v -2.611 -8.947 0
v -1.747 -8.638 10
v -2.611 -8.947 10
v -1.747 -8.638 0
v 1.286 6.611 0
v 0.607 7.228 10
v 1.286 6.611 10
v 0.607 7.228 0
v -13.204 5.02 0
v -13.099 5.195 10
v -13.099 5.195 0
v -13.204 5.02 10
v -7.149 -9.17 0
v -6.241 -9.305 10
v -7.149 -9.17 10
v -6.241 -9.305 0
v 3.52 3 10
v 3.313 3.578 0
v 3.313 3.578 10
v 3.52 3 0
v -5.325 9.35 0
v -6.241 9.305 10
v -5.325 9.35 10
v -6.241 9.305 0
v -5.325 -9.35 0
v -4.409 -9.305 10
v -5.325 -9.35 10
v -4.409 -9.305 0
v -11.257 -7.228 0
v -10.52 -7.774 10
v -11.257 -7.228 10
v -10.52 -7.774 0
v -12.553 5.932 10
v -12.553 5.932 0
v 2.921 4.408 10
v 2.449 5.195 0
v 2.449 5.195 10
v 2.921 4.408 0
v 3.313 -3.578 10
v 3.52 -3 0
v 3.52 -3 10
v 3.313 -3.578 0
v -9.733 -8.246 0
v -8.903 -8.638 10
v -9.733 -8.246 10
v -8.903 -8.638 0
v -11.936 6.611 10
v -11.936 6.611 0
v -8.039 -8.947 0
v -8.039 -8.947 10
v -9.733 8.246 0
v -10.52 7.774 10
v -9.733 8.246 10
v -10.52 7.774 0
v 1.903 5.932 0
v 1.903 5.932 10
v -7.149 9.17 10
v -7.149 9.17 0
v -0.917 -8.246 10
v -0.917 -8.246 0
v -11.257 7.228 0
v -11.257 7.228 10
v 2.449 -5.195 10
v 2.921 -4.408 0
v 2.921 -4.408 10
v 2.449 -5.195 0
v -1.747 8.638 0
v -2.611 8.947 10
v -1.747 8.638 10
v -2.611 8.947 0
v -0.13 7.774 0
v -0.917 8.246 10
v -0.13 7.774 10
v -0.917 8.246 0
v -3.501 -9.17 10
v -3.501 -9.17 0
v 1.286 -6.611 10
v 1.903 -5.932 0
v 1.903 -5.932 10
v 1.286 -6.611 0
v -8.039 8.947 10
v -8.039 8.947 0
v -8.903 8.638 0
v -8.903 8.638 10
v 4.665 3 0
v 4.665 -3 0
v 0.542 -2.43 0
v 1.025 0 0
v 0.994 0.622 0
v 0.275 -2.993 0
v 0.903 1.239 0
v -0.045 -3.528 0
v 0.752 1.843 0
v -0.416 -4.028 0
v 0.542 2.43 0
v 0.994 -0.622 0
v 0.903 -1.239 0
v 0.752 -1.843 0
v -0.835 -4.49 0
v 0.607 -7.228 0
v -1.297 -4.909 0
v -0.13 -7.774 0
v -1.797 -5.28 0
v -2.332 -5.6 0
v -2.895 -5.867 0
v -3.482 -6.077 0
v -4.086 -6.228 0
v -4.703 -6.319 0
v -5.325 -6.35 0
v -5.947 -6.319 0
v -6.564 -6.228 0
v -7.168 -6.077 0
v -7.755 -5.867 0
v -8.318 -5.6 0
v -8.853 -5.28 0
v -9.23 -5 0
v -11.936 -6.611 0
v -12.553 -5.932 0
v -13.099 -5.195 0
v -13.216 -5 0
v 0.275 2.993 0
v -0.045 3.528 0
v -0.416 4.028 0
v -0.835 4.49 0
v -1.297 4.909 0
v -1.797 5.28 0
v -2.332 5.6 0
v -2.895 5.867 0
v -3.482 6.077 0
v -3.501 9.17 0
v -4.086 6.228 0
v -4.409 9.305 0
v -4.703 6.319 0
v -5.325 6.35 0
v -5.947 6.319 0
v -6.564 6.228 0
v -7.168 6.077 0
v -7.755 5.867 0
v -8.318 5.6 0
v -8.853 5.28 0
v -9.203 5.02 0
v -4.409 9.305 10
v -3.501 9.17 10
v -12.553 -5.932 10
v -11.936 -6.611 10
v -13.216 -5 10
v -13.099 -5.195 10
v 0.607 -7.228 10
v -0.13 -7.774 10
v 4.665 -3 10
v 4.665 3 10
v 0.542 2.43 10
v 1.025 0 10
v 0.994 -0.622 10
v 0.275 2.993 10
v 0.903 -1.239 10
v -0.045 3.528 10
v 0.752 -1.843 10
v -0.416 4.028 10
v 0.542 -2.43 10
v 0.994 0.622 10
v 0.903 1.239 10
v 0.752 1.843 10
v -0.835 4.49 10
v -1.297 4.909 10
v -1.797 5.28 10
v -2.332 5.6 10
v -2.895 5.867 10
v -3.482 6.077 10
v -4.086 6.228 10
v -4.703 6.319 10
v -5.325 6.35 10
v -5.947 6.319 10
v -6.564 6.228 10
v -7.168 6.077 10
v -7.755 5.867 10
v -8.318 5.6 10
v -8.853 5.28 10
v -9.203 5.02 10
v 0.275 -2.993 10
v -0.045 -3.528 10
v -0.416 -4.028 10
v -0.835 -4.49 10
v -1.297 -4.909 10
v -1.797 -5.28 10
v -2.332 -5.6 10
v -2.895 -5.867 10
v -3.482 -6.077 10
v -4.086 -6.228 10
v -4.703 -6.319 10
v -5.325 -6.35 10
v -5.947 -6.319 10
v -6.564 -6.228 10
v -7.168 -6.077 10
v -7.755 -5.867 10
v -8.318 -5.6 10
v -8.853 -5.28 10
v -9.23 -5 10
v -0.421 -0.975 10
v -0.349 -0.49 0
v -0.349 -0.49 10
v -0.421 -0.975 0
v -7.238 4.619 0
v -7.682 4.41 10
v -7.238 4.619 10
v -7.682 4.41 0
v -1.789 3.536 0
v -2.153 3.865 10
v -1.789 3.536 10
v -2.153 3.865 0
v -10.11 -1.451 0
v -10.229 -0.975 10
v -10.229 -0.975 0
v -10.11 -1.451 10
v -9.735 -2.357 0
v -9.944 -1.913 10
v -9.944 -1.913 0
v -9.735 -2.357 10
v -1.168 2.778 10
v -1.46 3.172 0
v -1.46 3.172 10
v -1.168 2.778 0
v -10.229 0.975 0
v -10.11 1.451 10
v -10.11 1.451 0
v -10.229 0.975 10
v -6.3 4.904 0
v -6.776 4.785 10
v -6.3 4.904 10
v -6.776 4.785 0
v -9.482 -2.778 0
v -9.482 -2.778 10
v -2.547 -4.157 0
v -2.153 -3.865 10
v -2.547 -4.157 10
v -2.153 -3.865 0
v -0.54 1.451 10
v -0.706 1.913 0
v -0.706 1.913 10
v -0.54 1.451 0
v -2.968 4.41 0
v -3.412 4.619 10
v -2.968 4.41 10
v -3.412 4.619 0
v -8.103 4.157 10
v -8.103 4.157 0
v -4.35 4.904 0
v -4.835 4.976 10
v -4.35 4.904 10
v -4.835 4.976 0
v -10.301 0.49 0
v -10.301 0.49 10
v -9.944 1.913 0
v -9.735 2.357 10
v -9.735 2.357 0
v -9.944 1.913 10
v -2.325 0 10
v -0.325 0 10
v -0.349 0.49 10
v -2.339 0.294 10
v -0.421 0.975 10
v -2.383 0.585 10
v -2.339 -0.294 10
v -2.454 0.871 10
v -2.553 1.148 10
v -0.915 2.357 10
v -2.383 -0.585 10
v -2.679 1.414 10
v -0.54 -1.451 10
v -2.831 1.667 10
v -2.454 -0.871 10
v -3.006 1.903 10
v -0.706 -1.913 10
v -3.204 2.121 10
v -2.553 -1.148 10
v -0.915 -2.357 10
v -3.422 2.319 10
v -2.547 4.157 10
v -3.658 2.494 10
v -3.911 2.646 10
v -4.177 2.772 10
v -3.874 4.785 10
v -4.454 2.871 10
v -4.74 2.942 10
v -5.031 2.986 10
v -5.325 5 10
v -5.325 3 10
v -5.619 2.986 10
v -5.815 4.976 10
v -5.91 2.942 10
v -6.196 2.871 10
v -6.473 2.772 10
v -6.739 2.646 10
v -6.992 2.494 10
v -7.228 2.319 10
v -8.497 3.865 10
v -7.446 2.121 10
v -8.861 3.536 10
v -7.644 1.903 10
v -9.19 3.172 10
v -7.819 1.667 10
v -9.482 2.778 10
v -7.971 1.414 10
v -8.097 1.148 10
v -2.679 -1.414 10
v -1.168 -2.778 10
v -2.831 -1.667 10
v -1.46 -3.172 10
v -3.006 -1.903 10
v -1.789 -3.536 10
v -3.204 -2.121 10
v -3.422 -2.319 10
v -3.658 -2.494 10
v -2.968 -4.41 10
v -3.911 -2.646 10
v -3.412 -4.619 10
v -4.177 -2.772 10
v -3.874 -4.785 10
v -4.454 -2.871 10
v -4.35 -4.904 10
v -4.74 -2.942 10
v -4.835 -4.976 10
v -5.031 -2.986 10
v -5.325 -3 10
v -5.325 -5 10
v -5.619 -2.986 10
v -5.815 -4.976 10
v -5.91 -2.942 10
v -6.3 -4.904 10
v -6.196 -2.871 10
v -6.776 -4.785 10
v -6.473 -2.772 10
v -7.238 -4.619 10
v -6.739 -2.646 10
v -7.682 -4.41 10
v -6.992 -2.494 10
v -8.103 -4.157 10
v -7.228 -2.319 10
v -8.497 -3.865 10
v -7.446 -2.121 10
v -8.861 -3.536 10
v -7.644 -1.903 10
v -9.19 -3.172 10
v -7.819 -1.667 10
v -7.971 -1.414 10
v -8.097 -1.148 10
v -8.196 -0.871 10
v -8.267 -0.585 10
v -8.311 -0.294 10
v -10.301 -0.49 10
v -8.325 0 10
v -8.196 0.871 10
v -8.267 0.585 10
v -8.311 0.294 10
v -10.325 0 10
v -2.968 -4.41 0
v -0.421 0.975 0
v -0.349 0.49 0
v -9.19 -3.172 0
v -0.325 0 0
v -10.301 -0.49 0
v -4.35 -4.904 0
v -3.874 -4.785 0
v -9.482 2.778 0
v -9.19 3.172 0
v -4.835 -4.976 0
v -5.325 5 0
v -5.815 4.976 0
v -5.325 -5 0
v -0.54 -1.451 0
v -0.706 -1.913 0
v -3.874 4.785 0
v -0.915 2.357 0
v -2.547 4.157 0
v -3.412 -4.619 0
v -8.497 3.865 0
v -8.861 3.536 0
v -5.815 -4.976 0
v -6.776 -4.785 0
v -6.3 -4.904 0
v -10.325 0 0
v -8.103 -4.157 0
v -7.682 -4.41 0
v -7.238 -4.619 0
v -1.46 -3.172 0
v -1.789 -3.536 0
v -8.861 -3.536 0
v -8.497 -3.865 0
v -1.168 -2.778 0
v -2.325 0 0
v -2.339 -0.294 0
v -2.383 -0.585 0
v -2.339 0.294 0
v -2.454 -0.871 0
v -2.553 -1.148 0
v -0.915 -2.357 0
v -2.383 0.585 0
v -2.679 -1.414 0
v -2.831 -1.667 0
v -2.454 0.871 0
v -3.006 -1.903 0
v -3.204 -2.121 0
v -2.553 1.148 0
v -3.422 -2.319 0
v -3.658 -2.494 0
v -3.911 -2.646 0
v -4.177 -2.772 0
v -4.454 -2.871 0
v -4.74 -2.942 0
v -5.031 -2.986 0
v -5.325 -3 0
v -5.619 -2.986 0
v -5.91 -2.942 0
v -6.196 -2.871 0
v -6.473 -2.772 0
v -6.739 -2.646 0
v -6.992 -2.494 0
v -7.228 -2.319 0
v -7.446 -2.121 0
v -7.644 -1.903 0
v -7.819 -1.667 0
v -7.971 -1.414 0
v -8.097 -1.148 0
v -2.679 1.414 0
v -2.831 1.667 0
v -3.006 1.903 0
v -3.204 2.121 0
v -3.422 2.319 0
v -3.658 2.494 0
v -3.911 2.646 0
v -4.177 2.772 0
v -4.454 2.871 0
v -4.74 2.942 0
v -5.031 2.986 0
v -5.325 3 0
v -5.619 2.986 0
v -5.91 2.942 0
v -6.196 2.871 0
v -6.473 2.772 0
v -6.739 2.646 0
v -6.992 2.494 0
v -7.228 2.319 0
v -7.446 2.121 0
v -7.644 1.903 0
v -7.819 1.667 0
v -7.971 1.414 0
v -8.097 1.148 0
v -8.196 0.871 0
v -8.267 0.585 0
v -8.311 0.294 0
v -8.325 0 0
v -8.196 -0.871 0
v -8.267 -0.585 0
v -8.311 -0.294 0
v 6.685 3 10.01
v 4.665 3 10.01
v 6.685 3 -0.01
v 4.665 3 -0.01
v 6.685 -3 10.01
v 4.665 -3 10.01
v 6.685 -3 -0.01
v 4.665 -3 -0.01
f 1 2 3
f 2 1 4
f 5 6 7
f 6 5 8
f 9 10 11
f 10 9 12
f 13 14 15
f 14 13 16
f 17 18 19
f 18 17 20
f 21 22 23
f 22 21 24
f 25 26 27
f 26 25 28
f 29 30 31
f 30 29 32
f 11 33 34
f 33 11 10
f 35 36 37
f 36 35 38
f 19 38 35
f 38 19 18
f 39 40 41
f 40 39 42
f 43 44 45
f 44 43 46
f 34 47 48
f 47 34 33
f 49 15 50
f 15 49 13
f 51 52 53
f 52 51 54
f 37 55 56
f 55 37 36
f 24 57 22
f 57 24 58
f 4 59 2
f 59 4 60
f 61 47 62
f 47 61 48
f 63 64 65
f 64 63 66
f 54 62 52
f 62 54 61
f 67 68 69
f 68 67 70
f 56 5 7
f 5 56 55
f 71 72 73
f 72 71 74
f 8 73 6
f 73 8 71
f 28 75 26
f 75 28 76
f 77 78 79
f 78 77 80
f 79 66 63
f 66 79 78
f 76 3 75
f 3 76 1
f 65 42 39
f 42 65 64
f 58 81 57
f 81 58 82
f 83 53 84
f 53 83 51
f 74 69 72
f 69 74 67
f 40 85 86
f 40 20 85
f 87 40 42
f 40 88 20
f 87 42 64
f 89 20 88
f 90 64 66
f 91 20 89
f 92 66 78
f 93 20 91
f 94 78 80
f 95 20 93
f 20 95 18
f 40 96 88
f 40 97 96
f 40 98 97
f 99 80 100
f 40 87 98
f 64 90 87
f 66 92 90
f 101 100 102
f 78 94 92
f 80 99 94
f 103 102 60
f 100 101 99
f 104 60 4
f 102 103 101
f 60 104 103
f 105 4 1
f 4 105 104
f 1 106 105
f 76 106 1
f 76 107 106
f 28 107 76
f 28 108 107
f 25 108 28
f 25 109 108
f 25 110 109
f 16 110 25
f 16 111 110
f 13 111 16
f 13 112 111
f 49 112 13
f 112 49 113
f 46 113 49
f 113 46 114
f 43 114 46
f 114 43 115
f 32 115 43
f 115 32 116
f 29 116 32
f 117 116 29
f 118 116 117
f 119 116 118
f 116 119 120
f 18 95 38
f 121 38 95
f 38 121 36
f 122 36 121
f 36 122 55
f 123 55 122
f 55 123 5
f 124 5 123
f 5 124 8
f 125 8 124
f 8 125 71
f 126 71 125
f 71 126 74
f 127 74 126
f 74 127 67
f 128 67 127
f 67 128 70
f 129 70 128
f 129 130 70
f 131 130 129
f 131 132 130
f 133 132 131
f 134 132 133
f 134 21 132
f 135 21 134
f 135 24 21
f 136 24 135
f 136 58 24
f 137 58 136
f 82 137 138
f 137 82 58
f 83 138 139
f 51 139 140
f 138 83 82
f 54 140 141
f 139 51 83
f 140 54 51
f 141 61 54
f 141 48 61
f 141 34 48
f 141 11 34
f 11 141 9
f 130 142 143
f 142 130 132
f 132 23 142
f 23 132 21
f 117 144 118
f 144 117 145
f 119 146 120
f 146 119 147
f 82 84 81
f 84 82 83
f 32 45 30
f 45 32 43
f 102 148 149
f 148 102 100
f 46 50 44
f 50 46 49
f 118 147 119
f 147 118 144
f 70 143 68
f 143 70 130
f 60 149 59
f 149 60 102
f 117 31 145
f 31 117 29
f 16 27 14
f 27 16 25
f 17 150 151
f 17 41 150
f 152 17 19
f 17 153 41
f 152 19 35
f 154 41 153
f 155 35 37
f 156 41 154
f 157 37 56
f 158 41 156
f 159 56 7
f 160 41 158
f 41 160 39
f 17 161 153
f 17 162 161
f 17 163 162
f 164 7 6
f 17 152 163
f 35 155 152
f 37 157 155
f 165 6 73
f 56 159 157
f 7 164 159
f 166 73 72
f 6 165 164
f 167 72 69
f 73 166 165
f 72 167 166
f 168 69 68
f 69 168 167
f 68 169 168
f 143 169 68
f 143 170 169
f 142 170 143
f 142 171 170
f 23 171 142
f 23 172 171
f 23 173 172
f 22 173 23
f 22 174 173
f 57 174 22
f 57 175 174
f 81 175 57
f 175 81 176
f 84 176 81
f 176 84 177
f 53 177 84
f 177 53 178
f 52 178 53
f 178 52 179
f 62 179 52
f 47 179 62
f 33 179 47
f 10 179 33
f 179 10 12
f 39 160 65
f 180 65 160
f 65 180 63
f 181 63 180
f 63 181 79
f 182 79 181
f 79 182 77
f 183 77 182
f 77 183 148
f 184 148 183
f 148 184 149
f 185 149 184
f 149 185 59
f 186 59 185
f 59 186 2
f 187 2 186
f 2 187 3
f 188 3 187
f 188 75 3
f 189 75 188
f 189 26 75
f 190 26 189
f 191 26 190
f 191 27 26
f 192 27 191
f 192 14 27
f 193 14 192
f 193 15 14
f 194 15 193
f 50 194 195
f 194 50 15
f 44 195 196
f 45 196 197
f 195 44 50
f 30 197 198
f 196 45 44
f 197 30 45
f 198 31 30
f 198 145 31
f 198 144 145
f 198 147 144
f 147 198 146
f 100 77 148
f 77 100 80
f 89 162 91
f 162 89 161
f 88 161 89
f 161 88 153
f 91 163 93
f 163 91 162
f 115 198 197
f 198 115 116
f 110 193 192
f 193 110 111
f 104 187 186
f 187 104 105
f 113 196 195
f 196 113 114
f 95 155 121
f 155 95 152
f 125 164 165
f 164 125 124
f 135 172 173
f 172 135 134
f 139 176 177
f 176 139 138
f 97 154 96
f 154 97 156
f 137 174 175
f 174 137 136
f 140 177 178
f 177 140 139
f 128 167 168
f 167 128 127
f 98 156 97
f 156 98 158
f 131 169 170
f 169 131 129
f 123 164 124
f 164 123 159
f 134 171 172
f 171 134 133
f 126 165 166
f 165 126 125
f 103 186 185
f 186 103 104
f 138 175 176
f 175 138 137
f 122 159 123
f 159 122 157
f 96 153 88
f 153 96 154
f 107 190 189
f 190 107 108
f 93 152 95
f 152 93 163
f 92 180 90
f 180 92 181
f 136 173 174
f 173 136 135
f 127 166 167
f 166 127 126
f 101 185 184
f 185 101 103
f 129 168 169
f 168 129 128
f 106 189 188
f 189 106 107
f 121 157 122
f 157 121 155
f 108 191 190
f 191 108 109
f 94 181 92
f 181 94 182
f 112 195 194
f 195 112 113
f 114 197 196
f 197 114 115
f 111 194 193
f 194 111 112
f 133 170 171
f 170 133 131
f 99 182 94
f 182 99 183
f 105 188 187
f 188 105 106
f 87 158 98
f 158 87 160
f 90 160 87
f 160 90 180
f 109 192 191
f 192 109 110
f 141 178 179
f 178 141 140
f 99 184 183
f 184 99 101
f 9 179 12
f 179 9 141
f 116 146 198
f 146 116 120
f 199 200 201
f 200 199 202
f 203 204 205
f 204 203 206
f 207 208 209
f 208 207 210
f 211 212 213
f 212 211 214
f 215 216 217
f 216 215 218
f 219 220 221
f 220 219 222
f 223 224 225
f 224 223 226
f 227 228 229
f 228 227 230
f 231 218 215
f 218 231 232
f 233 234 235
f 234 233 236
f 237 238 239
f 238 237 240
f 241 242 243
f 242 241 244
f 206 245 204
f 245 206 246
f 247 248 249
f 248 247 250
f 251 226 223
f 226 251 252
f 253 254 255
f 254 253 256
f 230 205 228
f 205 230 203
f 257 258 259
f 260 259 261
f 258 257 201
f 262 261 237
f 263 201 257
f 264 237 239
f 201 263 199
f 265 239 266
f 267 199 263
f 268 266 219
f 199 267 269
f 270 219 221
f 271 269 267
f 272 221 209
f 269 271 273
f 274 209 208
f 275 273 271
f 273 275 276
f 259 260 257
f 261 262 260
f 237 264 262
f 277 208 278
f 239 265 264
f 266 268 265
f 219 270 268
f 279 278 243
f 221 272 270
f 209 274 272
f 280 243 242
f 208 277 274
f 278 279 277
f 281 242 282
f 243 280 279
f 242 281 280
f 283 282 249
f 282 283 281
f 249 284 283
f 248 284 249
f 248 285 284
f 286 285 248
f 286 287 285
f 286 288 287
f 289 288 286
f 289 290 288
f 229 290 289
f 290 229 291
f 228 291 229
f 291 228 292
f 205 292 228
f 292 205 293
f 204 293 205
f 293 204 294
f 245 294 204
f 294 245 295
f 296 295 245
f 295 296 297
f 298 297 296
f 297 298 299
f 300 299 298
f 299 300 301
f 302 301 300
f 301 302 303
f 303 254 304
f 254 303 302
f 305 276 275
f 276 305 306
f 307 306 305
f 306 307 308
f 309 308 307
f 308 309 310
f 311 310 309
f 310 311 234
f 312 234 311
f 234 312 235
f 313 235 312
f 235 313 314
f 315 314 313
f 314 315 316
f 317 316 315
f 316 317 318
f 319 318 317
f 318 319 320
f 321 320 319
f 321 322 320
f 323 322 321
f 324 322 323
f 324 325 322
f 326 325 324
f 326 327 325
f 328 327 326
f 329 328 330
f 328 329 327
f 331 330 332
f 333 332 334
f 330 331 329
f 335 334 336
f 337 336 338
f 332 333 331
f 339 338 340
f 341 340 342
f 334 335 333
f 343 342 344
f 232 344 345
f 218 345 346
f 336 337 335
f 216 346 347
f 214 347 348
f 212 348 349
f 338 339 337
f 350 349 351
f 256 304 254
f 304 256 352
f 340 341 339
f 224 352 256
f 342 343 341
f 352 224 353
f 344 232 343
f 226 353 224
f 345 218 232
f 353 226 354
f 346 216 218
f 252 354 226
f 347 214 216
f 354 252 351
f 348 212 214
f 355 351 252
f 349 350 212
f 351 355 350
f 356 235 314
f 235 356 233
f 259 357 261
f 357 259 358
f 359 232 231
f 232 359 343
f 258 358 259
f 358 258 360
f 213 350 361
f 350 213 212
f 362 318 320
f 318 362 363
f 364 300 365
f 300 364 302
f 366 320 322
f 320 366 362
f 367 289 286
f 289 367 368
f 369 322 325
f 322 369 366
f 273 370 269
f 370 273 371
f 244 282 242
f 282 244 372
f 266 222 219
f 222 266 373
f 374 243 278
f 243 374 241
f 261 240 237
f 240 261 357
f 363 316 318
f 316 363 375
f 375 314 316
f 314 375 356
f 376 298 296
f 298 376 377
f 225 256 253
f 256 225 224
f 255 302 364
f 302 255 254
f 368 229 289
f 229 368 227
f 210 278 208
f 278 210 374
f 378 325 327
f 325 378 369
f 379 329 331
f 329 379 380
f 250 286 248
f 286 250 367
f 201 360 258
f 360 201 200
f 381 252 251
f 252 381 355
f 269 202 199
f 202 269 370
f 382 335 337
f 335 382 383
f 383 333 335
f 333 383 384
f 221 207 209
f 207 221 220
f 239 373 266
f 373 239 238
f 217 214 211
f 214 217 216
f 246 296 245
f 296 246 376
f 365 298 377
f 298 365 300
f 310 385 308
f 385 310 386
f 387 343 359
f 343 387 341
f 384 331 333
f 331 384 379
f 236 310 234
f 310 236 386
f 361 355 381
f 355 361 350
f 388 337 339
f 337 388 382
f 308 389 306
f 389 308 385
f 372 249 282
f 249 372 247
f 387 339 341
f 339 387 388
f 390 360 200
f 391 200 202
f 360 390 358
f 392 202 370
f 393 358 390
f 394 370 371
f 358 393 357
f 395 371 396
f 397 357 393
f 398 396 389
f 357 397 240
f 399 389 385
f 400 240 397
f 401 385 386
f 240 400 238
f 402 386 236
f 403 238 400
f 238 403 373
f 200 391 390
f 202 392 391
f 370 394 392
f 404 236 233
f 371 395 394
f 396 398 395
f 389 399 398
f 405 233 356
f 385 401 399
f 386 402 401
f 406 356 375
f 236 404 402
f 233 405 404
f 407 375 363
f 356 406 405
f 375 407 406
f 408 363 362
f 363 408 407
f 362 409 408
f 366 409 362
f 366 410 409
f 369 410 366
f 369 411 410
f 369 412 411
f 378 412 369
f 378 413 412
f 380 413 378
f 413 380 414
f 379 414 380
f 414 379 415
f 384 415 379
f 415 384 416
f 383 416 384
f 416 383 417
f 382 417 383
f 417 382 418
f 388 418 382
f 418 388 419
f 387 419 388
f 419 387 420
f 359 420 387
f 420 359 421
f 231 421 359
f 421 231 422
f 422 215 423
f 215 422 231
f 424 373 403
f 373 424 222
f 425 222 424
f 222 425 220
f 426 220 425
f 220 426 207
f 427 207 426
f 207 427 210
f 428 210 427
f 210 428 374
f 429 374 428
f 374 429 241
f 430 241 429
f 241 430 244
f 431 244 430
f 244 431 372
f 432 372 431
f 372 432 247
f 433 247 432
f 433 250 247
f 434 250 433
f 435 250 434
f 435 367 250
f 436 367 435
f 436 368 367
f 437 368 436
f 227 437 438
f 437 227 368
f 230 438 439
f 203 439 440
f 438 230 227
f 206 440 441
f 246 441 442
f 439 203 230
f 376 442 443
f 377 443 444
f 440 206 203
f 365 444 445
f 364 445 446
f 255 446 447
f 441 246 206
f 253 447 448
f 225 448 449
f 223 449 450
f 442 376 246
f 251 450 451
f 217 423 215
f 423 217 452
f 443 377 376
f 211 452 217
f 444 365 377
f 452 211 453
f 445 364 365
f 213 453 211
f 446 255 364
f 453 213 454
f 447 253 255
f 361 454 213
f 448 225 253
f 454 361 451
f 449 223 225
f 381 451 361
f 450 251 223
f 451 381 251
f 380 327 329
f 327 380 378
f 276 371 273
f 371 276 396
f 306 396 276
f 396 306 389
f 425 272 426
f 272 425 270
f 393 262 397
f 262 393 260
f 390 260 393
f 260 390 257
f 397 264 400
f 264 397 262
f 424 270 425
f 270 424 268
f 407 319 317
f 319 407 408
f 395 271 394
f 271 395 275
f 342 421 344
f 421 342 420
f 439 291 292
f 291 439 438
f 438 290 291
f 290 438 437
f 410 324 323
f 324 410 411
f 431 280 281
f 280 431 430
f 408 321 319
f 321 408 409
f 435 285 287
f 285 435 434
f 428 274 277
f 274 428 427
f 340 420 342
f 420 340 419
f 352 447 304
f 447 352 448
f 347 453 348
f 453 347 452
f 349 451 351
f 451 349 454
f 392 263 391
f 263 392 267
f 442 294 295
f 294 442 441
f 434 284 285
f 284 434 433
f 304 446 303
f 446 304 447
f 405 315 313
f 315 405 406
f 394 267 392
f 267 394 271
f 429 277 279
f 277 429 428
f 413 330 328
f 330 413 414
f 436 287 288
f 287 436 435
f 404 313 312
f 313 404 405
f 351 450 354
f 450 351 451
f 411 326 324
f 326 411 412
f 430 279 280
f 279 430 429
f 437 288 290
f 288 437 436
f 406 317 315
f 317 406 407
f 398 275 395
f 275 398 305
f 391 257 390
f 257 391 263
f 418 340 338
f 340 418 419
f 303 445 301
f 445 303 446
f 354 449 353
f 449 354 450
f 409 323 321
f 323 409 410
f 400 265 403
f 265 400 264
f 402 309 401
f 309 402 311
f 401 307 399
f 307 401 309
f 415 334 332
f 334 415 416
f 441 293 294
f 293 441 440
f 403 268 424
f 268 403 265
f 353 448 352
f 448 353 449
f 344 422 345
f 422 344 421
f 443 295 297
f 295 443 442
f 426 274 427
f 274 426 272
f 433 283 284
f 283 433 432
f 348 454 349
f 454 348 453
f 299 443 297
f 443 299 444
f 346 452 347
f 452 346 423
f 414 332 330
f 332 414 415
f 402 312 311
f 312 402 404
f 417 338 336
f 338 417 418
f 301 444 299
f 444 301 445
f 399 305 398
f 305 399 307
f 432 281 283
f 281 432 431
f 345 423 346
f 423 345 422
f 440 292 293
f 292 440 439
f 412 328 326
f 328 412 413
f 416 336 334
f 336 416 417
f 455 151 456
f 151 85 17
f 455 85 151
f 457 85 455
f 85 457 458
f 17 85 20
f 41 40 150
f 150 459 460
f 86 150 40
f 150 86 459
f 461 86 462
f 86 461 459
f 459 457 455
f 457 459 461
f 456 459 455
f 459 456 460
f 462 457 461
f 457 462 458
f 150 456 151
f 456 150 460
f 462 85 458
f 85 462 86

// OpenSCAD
// ---------- Parameters ----------
rod_inner_d   = 12.7;          // inner diameter of the rod ring (mm)
rod_wall      = 3;            // wall thickness of the rod ring (mm)
rod_outer_d   = rod_inner_d + 2*rod_wall; // outer diameter of the rod ring (mm)

tubing_inner_d = 6;           // inner diameter of the tubing ring (mm)
tubing_wall    = 2;           // wall thickness of the tubing ring (mm)
tubing_outer_d = tubing_inner_d + 2*tubing_wall; // outer diameter of the tubing ring (mm)

rod_center     = [0,0];       // centre of the rod ring (mm)
tubing_center = [15,0];      // centre of the tubing ring (mm)

bridge_x_start = 8;           // left x‑edge of the bridge (mm)
bridge_x_end   = 12;          // right x‑edge of the bridge (mm)
bridge_width_y = 6;           // total width in Y direction (mm)

height = 10;                  // extrusion height (mm)

$fn = 64;                     // resolution for circles/cylinders

// ---------- Global centering (XY) ----------
min_x = -rod_outer_d/2;                     // leftmost point of the whole part
max_x = tubing_center[0] + tubing_outer_d/2; // rightmost point of the whole part
center_shift_x = -( (max_x + min_x)/2 );    // shift needed to centre on origin

// ---------- Modules ----------
module rod_ring() {
    // Outer cylinder minus inner cylinder
    difference(){
        cylinder(r=rod_outer_d/2, h=height, center=true);
        cylinder(r=rod_inner_d/2, h=height+0.02, center=true);
        // Opening on the -X side (x < 0, -5 < y < 5)
        translate([-200, -5, -height/2-0.01])
            cube([200, 10.02, height+0.02]); // extends far beyond the ring
    }
    translate(rod_center) {} // already at its intended position
}

module tubing_ring() {
    // Outer cylinder minus inner cylinder
    difference(){
        cylinder(r=tubing_outer_d/2, h=height, center=true);
        cylinder(r=tubing_inner_d/2, h=height+0.02, center=true);
        // Opening on the +X side (x > 15, -2.25 < y < 2.25)
        translate([tubing_center[0], -2.25, -height/2-0.01])
            cube([200, 4.52, height+0.02]); // extends far beyond the ring
    }
    translate(tubing_center) {} // already at its intended position
}

module bridge() {
    // Solid bridge 6 mm wide (Y) between x = 8 and x = 12
    translate([ (bridge_x_start+bridge_x_end)/2, 0, 0])
        cube([bridge_x_end-bridge_x_start, bridge_width_y, height], center=true);
}

// Extra connector that links the bridge to the tubing ring
module bridge_to_tubing_connector() {
    // Left wall of tubing ring
    left_tubing = tubing_center[0] - tubing_outer_d/2; // 10 mm
    // Connector spans from bridge right edge (12) to left wall of tubing (10)
    conn_len = (bridge_x_end - left_tubing) + 0.02; // add 0.02 mm for clearance
    translate([ (bridge_x_end + left_tubing)/2, 0, 0])
        cube([conn_len, bridge_width_y, height+0.02], center=true);
}

// ---------- Assembly ----------
translate([center_shift_x, 0, height/2])   // centre XY and raise bottom to Z = 0
union() {
    rod_ring();
    tubing_ring();
    bridge();
    bridge_to_tubing_connector();
}
